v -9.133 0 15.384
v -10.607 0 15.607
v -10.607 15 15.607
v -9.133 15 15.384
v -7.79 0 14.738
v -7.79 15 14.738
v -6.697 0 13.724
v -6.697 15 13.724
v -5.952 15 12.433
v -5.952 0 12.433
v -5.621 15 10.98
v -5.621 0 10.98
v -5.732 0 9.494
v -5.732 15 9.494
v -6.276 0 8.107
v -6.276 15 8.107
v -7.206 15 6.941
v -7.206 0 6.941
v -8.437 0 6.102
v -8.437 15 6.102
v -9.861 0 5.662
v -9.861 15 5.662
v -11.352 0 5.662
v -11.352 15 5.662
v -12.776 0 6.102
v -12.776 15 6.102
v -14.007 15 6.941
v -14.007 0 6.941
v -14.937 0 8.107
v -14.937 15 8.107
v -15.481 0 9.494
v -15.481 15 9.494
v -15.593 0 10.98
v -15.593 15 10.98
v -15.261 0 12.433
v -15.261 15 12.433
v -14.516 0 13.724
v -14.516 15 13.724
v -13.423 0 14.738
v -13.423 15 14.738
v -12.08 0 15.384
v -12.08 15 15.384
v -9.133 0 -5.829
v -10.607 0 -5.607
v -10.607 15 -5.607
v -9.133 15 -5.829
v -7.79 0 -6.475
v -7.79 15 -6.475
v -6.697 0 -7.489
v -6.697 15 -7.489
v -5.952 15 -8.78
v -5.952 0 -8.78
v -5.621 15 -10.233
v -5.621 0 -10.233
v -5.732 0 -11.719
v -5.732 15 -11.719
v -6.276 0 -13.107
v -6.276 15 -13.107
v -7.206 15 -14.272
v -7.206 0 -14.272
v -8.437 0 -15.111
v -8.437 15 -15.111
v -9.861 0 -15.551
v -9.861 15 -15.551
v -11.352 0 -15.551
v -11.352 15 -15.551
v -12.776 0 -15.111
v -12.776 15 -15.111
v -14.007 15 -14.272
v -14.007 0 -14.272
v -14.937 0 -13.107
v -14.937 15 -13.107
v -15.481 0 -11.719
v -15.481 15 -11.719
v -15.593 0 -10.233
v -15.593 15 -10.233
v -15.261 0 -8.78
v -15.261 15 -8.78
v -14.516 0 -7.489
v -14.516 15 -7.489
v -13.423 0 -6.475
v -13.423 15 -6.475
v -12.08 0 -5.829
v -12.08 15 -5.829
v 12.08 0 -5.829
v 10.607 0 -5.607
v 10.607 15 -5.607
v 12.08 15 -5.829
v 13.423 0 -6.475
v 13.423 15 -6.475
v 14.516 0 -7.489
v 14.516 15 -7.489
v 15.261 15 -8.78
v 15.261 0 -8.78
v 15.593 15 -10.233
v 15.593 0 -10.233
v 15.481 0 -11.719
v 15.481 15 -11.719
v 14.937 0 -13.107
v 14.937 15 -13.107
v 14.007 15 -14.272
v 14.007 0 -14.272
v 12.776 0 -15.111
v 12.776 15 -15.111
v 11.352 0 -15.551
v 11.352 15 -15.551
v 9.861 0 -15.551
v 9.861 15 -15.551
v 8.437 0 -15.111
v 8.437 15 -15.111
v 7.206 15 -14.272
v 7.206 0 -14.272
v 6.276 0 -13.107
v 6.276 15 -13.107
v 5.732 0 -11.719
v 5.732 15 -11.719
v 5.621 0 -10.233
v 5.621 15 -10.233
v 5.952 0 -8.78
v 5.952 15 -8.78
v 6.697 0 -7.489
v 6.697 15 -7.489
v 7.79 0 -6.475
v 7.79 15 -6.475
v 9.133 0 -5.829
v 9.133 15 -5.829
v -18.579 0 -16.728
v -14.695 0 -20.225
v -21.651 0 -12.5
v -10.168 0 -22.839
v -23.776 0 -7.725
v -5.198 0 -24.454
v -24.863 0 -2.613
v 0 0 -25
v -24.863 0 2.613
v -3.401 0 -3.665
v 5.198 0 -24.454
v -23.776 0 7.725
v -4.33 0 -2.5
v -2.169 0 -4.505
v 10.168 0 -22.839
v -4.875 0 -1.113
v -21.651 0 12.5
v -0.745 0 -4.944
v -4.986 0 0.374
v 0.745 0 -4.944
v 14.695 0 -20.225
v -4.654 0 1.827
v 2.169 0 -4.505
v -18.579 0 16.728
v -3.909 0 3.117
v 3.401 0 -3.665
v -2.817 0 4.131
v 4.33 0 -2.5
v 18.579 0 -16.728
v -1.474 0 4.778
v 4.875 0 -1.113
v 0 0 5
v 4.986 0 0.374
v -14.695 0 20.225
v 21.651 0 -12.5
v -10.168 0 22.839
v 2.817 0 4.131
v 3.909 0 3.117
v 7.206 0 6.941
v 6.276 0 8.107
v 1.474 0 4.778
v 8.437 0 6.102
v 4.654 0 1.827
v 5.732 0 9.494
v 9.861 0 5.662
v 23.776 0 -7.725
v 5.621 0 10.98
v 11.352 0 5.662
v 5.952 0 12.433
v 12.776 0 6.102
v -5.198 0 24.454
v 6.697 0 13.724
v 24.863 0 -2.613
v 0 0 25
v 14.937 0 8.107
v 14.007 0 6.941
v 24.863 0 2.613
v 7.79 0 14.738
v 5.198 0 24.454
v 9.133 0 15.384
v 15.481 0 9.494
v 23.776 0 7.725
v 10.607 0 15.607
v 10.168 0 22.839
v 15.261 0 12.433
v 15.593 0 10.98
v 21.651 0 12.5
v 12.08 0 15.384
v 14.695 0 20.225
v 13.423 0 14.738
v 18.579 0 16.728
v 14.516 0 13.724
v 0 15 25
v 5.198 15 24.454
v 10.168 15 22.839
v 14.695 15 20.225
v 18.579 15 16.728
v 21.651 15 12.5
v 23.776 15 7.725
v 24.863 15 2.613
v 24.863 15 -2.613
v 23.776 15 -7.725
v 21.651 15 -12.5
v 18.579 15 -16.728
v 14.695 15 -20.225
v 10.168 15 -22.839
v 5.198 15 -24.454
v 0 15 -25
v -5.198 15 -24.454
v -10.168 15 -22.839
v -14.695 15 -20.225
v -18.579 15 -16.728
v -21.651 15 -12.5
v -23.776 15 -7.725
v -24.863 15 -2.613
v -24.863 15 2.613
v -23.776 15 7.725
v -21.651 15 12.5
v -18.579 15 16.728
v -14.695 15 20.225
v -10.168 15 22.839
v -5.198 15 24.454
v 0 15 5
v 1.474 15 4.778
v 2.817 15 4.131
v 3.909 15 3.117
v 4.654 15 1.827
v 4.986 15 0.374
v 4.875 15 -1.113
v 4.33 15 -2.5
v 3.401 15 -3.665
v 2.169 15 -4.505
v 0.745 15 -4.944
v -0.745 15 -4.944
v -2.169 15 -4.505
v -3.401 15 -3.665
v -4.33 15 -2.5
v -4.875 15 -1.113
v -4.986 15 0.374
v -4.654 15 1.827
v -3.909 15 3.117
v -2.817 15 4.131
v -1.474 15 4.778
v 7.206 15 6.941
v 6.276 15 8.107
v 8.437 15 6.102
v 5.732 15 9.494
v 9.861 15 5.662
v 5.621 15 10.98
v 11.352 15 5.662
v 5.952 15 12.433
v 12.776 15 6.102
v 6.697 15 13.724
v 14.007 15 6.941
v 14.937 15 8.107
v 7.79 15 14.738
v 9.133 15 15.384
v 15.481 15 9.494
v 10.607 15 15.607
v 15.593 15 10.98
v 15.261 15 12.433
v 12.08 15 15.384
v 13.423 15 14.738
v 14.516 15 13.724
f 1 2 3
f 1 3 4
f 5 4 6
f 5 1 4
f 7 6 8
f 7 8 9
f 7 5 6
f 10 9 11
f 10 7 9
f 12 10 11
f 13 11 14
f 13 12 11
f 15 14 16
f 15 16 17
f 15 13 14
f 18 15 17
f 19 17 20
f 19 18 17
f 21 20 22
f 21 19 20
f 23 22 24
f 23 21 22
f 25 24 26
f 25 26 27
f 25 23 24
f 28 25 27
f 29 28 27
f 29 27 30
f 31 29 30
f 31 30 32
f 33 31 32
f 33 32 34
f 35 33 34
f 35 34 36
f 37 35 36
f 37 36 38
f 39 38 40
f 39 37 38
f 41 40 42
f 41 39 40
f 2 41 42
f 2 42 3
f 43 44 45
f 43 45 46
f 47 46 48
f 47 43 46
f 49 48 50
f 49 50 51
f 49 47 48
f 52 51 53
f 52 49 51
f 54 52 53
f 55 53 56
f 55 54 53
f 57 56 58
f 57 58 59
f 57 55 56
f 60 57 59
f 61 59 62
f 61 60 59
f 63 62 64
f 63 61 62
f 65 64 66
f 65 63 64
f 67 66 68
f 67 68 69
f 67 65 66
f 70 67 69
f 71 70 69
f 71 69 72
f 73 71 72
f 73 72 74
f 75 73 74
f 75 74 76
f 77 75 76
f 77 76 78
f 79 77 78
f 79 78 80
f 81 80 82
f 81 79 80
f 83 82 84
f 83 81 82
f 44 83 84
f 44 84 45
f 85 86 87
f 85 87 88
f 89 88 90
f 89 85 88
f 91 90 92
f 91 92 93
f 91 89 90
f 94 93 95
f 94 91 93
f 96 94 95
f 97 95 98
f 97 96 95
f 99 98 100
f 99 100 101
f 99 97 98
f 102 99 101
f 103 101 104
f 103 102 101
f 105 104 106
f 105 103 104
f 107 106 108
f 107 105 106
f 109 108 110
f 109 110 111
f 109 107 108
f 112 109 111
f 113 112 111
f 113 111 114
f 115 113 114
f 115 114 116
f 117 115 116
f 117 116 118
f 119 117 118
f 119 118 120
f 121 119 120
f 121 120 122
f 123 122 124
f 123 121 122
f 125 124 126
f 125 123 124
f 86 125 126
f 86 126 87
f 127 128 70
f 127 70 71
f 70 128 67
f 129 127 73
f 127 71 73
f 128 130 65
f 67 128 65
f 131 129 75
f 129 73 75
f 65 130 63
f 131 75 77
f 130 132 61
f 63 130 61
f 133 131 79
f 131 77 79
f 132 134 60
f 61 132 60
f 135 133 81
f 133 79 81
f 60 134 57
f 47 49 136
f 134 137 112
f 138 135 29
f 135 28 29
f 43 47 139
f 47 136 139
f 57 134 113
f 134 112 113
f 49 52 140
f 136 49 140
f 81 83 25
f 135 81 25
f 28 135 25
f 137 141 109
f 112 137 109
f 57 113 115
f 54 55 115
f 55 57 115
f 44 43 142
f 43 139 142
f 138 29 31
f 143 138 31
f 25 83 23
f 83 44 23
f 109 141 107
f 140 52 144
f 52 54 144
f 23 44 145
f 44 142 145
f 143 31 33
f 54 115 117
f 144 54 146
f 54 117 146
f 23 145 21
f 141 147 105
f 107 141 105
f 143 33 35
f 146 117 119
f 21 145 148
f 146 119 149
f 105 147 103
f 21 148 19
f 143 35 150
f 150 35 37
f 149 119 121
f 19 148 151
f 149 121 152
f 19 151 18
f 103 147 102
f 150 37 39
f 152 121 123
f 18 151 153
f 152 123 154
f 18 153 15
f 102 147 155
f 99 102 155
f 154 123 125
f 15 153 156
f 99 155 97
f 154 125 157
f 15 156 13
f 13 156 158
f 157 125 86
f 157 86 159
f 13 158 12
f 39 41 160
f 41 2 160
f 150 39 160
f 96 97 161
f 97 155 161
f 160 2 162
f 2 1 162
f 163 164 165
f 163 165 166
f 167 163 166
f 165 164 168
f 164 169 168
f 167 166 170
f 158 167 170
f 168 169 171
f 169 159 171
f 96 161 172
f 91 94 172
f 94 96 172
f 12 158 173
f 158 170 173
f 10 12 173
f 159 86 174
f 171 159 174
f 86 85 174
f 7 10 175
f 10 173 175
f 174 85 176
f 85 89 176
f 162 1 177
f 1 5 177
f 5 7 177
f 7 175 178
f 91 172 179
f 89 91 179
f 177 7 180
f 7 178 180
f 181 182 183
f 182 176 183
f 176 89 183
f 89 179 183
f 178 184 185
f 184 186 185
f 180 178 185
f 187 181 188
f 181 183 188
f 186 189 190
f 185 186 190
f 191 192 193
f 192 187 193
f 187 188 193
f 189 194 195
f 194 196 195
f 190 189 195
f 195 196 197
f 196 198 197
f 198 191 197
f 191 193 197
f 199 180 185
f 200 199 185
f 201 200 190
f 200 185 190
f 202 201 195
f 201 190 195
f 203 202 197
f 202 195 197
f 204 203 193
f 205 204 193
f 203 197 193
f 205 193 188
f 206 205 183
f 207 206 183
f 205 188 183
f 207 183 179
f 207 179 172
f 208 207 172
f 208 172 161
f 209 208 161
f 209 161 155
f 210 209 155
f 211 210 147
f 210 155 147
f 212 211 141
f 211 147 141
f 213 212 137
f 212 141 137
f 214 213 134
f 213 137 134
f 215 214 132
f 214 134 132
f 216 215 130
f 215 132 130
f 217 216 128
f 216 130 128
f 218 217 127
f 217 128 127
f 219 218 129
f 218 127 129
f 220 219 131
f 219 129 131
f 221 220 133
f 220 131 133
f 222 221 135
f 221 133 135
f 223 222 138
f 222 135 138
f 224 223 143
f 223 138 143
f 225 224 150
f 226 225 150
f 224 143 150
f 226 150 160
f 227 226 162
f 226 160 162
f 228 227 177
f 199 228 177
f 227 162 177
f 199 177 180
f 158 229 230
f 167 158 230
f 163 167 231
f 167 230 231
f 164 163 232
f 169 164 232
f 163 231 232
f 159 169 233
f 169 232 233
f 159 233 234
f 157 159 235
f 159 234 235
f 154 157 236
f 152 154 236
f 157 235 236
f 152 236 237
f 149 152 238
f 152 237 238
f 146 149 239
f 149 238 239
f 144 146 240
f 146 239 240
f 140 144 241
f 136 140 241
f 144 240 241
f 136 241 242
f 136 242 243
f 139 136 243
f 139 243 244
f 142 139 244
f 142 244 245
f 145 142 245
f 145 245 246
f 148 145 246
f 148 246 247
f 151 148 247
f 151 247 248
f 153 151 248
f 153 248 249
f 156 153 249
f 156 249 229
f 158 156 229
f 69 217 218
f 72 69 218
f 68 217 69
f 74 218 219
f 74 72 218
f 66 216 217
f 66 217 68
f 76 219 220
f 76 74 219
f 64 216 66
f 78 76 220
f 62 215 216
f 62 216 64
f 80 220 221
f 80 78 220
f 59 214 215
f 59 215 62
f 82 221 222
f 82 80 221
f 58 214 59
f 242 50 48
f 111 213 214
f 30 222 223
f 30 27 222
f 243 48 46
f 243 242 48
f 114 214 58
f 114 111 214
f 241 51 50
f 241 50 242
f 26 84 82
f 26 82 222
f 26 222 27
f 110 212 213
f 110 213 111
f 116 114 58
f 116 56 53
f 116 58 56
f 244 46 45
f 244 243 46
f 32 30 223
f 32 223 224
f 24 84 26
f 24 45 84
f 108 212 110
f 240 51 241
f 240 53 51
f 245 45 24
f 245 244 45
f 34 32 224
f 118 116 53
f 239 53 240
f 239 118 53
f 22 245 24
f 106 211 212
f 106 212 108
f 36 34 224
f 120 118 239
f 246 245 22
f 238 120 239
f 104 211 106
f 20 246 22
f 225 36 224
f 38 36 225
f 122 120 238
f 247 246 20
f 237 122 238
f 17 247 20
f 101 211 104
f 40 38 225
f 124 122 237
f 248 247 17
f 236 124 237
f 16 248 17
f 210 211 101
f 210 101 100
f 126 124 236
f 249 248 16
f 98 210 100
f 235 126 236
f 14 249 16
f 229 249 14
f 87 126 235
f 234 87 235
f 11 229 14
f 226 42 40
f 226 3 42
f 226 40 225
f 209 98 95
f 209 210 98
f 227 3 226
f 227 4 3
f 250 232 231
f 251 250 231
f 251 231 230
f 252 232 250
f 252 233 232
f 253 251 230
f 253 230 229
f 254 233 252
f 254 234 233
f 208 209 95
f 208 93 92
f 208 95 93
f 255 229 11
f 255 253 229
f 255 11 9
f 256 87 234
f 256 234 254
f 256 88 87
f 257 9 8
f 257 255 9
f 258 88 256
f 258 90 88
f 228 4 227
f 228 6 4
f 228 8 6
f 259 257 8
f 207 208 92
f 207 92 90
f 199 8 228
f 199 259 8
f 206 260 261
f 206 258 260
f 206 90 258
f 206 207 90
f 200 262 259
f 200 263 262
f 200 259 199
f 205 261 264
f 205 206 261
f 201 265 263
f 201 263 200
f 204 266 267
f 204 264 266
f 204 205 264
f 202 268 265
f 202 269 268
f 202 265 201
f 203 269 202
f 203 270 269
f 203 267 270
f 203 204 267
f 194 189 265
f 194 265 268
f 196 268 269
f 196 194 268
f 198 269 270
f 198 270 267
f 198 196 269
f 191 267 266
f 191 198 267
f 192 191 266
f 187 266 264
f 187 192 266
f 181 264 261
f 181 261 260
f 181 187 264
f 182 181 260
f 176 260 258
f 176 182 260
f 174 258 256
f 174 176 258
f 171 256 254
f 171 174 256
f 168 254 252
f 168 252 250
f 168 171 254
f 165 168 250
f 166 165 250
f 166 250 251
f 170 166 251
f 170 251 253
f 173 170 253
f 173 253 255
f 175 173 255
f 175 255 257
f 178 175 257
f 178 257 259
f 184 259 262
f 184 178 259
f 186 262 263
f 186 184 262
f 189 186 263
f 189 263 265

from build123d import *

# Parameters (mm, degrees)
SKETCH1_R           = 25
SKETCH1_R_2         = 5
BOSS_EXTRUDE1_DEPTH = 15
SKETCH2_R           = 5
CUT_EXTRUDE1_DEPTH  = 39.405728739


with BuildPart() as part:
    # Sketch1 → Boss-Extrude1 (new body)
    with BuildSketch(Plane(origin=(0, 0, 0), x_dir=(1, 0, 0), z_dir=(0, 1, 0))):
        with Locations(Location((0, 0, 0), (0, 0, 270))):
            Circle(SKETCH1_R)
        with Locations(Location((10.606601718, 10.606601718, 0), (0, 0, 270))):
            Circle(SKETCH1_R_2, mode=Mode.SUBTRACT)
        with Locations(Location((10.606601718, -10.606601718, 0), (0, 0, 270))):
            Circle(SKETCH1_R_2, mode=Mode.SUBTRACT)
        with Locations(Location((-10.606601718, -10.606601718, 0), (0, 0, 270))):
            Circle(SKETCH1_R_2, mode=Mode.SUBTRACT)
        with Locations(Location((-10.606601718, 10.606601718, 0), (0, 0, 270))):
            Circle(SKETCH1_R_2, mode=Mode.SUBTRACT)
    extrude(amount=BOSS_EXTRUDE1_DEPTH)

    # Sketch2 → Cut-Extrude1 (cut, through all)
    with BuildSketch(Plane(origin=(0, 15, 0), x_dir=(1, 0, 0), z_dir=(0, 1, 0))):
        with Locations(Location((0, 0, 0), (0, 0, 270))):
            Circle(SKETCH2_R)
    extrude(amount=-CUT_EXTRUDE1_DEPTH, mode=Mode.SUBTRACT)


solid = part.part
